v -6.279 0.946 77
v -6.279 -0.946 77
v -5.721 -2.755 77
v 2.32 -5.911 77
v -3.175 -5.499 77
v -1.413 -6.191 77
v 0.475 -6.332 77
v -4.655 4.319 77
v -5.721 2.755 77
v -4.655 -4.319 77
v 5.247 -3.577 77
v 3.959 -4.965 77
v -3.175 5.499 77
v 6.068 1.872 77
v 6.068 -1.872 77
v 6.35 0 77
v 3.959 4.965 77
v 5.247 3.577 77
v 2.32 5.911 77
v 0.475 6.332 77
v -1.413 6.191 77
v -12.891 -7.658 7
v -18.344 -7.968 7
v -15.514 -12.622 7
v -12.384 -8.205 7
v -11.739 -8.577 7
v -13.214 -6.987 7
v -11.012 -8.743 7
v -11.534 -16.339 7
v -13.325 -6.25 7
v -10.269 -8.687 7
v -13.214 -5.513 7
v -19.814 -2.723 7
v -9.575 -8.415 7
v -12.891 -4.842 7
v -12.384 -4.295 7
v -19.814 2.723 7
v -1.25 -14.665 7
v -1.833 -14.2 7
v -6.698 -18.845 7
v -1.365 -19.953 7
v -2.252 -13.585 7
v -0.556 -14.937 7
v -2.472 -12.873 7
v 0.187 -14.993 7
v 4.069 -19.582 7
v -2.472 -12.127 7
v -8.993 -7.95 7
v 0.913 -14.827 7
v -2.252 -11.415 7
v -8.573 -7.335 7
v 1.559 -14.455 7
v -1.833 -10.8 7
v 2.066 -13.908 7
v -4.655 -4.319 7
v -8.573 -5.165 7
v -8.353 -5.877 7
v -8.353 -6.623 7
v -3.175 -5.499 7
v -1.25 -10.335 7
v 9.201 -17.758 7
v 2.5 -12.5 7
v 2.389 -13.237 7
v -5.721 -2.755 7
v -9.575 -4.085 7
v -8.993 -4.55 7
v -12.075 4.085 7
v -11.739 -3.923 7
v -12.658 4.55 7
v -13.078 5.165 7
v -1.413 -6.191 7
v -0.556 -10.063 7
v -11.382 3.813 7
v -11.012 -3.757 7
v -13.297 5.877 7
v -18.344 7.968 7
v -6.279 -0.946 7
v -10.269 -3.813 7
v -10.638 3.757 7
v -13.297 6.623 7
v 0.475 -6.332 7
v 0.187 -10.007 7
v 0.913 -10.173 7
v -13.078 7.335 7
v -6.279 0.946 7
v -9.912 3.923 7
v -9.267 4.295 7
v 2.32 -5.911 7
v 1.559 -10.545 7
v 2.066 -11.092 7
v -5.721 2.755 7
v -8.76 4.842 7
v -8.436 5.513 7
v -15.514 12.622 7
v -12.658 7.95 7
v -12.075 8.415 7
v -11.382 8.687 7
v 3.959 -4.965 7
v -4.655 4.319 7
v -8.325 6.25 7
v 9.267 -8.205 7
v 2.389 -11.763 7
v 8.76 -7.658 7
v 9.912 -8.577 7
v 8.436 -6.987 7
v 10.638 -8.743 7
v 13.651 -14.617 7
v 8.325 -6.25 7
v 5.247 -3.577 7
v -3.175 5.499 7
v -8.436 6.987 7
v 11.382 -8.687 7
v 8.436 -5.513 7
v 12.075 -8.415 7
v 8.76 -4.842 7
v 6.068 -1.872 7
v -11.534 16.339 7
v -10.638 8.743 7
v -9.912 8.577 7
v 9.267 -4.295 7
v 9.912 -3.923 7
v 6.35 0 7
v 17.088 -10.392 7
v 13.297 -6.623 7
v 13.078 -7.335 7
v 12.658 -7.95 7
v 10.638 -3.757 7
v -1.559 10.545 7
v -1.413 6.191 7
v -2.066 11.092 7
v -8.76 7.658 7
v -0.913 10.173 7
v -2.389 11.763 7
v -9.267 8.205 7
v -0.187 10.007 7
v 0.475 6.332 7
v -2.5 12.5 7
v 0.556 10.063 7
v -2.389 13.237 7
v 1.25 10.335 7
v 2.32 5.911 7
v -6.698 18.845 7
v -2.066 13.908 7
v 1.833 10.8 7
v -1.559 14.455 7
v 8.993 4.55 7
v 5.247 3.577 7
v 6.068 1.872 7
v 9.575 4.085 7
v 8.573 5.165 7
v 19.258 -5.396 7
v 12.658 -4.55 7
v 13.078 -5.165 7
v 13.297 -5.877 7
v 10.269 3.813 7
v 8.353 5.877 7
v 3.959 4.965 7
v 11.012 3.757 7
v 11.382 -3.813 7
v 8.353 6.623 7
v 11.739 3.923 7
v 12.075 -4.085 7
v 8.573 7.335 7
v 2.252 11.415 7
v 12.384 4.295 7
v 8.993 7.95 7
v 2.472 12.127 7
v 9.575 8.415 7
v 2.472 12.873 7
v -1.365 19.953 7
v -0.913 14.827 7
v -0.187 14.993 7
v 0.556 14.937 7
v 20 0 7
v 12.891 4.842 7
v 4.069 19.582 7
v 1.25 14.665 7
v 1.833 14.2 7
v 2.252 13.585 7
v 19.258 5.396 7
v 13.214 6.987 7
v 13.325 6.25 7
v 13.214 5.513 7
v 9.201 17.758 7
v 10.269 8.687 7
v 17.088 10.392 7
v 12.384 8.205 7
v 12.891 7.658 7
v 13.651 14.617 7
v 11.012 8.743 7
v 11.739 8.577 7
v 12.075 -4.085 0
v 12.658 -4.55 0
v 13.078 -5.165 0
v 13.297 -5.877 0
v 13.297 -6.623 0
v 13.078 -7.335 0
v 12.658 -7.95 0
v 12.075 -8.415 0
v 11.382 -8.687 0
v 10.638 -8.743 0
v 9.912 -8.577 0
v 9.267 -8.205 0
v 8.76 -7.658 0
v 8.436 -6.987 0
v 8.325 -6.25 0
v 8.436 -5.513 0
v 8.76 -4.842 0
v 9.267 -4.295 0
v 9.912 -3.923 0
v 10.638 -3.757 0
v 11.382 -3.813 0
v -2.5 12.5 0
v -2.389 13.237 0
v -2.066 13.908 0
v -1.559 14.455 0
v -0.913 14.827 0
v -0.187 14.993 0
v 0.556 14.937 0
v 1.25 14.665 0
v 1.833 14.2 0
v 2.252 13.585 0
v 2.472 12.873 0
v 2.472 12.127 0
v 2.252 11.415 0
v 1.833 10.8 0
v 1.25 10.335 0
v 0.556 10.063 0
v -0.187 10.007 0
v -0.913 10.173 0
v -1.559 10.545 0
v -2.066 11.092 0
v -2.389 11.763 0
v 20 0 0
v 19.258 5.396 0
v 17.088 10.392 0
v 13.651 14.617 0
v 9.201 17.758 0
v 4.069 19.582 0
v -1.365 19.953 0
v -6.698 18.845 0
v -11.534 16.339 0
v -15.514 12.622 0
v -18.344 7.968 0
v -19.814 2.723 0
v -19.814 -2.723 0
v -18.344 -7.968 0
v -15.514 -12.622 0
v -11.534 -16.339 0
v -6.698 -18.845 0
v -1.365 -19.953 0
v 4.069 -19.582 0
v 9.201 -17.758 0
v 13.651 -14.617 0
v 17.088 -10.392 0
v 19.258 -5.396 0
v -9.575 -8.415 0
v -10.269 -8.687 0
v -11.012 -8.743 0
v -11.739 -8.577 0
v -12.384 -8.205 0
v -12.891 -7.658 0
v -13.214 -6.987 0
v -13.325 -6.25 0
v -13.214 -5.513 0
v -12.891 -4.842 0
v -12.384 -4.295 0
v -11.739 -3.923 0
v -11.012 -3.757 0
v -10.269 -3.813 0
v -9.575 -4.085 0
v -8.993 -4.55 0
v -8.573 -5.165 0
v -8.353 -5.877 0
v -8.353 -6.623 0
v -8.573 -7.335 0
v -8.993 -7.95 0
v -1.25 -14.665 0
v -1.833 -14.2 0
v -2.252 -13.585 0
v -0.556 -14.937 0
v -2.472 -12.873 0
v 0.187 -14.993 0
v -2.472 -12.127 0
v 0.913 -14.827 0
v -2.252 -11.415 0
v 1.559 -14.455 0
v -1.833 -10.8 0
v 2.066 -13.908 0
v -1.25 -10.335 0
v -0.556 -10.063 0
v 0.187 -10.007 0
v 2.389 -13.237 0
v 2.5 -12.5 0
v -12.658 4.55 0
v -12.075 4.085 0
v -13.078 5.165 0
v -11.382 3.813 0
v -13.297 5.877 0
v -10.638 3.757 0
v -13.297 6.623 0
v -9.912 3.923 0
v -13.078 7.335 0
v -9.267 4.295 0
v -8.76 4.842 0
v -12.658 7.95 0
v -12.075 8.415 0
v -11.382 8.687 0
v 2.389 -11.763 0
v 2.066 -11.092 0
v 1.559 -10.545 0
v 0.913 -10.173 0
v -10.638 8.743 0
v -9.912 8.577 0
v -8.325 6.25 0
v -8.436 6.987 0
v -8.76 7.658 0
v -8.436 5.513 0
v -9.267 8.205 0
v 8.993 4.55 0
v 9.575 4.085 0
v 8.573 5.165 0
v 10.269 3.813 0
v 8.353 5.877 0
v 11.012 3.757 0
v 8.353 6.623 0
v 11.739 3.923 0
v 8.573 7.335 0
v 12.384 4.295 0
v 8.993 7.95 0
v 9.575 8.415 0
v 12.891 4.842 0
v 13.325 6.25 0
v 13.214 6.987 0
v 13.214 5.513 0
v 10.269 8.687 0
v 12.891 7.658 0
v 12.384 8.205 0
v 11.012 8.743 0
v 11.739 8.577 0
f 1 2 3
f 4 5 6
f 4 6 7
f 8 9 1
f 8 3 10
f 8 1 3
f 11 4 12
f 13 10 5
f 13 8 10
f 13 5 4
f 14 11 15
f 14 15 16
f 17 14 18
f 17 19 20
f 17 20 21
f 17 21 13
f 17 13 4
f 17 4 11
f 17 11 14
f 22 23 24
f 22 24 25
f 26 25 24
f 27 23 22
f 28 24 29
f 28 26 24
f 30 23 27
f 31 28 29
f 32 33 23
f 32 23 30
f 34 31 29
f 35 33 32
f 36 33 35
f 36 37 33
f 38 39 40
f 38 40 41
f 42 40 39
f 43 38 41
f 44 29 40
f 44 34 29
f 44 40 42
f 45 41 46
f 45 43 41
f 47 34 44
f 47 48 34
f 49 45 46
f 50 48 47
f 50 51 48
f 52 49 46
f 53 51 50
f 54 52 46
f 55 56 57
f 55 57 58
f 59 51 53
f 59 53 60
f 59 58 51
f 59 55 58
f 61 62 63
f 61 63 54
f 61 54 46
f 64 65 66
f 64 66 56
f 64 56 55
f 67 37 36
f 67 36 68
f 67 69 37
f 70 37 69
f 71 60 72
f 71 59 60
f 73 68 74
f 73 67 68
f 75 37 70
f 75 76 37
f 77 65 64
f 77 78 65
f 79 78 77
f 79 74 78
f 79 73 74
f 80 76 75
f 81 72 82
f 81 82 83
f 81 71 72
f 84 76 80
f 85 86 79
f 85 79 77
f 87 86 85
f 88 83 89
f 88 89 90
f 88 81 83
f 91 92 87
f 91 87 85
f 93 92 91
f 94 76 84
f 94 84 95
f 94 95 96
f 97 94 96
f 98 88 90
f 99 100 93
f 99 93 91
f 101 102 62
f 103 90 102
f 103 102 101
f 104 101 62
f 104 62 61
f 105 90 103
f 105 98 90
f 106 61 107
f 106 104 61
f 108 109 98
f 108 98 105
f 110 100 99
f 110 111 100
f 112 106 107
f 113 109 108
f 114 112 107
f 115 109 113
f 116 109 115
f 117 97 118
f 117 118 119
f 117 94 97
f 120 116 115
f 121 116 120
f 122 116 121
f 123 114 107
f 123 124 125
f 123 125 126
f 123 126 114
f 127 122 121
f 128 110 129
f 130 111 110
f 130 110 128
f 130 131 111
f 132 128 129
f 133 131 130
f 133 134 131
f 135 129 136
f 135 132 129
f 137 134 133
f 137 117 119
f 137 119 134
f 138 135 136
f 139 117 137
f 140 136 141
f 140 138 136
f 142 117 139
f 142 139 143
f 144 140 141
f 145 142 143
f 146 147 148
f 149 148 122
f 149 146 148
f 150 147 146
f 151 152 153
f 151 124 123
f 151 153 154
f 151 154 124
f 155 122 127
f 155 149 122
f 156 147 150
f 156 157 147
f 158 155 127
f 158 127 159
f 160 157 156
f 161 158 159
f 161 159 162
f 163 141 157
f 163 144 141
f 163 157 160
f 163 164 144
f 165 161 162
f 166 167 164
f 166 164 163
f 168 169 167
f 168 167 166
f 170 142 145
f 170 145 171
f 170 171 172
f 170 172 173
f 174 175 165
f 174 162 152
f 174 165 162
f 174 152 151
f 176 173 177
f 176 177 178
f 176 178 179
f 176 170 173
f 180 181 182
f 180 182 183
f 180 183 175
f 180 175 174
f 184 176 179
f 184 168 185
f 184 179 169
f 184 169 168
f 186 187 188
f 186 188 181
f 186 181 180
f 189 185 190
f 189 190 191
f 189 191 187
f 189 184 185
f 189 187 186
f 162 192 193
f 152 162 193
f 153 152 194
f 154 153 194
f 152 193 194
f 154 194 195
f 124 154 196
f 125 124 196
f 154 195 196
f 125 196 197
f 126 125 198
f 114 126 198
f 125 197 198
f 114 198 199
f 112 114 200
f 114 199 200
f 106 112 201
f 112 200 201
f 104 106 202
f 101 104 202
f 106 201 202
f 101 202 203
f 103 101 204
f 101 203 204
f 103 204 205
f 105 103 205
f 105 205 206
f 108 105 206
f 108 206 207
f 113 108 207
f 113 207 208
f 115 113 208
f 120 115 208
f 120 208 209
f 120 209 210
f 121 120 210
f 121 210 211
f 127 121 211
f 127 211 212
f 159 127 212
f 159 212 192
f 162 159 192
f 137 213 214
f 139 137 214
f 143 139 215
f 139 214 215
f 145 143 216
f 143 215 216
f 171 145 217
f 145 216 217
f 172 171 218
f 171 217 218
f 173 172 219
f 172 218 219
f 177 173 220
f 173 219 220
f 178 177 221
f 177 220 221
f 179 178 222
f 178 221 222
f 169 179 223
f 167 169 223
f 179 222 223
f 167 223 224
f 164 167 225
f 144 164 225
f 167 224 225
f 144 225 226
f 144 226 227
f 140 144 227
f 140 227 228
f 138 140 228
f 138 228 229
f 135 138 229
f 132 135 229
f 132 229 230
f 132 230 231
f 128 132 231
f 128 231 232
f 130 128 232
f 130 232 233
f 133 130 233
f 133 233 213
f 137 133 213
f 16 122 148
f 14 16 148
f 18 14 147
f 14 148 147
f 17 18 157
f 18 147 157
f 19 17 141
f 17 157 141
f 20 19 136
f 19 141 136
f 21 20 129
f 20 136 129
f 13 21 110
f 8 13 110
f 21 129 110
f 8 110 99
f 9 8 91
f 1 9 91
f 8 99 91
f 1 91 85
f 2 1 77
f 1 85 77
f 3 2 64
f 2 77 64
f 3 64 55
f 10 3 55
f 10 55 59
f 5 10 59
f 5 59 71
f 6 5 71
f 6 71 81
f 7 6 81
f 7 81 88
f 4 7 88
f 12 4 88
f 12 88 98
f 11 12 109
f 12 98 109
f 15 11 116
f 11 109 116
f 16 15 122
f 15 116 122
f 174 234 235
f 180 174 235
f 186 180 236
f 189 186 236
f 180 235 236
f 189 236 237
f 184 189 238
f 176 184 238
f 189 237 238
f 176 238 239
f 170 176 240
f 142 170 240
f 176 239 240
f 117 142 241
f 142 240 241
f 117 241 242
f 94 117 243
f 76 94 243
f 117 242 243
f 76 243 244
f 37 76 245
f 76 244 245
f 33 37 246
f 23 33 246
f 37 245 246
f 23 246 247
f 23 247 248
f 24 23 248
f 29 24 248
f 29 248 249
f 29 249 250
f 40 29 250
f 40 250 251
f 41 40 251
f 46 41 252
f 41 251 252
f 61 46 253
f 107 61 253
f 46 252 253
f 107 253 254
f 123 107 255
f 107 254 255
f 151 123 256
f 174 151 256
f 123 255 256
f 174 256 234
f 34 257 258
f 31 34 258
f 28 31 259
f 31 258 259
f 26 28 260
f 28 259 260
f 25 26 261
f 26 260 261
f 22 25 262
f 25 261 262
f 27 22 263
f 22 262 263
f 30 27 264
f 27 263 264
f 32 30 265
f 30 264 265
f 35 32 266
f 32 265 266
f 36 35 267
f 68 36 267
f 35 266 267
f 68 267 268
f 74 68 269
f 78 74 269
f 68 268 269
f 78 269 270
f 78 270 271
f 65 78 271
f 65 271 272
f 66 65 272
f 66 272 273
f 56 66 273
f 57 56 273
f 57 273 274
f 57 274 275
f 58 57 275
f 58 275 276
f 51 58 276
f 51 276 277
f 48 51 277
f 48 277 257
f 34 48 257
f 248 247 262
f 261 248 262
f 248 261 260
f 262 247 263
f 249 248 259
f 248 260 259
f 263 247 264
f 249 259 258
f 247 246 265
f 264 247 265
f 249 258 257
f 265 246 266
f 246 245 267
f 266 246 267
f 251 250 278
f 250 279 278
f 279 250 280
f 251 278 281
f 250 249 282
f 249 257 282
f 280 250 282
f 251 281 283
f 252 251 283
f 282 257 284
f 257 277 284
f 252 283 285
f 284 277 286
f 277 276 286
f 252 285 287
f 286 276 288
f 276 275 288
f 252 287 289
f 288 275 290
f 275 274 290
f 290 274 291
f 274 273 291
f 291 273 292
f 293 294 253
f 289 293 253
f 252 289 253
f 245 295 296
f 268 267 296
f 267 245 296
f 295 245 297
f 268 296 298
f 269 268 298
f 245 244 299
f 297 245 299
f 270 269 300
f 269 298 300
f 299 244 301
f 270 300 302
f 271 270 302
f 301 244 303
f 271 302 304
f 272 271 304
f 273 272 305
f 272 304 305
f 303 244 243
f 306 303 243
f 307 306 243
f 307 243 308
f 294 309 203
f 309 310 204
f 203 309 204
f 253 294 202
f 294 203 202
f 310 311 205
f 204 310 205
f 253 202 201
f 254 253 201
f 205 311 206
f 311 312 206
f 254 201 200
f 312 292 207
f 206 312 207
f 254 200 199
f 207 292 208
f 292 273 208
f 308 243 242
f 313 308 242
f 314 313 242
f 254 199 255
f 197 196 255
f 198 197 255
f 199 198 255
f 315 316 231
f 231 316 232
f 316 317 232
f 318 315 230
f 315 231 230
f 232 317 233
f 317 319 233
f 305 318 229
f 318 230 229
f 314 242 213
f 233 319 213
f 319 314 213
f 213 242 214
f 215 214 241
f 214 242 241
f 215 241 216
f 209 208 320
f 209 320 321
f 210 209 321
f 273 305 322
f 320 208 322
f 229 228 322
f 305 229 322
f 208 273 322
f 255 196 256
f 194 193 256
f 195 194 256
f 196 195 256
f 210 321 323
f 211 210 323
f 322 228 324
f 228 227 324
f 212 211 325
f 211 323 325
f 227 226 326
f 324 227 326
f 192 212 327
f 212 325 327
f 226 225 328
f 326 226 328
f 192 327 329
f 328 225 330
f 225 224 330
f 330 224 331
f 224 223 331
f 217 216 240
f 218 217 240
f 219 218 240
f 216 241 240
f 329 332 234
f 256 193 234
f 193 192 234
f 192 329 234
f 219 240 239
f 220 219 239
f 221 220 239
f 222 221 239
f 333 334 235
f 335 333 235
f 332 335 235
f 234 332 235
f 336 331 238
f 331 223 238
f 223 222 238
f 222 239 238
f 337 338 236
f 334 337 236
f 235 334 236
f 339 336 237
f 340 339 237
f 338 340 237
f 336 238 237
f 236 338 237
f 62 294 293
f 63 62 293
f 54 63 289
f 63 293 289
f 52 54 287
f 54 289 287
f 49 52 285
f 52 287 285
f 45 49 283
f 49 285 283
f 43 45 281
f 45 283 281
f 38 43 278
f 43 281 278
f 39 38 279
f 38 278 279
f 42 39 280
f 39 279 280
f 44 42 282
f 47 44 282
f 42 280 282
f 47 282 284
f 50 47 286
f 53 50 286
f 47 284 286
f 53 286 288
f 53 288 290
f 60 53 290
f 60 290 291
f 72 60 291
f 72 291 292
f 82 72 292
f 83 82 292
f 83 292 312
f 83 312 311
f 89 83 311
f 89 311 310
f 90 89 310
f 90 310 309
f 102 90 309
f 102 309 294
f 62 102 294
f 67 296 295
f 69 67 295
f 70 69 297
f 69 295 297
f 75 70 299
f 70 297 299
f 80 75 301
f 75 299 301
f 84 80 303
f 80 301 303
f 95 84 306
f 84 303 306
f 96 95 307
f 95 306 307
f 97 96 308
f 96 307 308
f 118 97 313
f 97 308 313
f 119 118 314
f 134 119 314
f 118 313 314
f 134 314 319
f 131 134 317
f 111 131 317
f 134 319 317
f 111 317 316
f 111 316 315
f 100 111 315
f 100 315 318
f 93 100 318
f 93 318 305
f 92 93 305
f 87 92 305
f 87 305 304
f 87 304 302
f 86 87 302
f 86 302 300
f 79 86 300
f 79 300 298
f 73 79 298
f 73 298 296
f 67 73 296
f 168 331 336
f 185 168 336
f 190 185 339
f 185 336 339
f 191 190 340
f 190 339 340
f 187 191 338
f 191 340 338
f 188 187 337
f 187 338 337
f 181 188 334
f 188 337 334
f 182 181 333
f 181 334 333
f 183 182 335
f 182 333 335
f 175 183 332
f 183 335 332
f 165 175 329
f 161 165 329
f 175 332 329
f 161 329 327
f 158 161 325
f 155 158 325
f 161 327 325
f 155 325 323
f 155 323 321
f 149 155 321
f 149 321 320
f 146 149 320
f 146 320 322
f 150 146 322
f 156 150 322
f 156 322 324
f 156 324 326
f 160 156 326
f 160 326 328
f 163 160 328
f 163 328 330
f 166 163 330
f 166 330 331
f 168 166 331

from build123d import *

# Parameters (mm, degrees)
SKETCH1_R                   = 20
BOSS_EXTRUDE1_DEPTH         = 7
TAP_DRILL_FOR_M6X1_0_TAP1_D = 5
CIRPATTERN1_COUNT           = 6
SKETCH3_R                   = 6.35
BOSS_EXTRUDE2_DEPTH         = 70


with BuildPart() as part:
    # Sketch1 → Boss-Extrude1 (new body)
    with BuildSketch(Plane.XY):
        Circle(SKETCH1_R)
    extrude(amount=BOSS_EXTRUDE1_DEPTH)

    # Tap Drill for M6x1.0 Tap1 (through all)
    with Locations(Plane.XY.offset(7)):
        with Locations((0, 12.5)):
            tap_drill_for_m6x1_0_tap1 = Hole(TAP_DRILL_FOR_M6X1_0_TAP1_D / 2)

    # CirPattern1: Tap Drill for M6x1.0 Tap1 ×6 about axis
    cirpattern1_axis = Axis((0, 0, 0), (0, 0, 1))
    for i in range(1, CIRPATTERN1_COUNT):
        add(tap_drill_for_m6x1_0_tap1.rotate(cirpattern1_axis, i * 360 / CIRPATTERN1_COUNT), mode=Mode.SUBTRACT)

    # Sketch3 → Boss-Extrude2 (add)
    with BuildSketch(Plane.XY.offset(7)):
        Circle(SKETCH3_R)
    extrude(amount=BOSS_EXTRUDE2_DEPTH)


solid = part.part
